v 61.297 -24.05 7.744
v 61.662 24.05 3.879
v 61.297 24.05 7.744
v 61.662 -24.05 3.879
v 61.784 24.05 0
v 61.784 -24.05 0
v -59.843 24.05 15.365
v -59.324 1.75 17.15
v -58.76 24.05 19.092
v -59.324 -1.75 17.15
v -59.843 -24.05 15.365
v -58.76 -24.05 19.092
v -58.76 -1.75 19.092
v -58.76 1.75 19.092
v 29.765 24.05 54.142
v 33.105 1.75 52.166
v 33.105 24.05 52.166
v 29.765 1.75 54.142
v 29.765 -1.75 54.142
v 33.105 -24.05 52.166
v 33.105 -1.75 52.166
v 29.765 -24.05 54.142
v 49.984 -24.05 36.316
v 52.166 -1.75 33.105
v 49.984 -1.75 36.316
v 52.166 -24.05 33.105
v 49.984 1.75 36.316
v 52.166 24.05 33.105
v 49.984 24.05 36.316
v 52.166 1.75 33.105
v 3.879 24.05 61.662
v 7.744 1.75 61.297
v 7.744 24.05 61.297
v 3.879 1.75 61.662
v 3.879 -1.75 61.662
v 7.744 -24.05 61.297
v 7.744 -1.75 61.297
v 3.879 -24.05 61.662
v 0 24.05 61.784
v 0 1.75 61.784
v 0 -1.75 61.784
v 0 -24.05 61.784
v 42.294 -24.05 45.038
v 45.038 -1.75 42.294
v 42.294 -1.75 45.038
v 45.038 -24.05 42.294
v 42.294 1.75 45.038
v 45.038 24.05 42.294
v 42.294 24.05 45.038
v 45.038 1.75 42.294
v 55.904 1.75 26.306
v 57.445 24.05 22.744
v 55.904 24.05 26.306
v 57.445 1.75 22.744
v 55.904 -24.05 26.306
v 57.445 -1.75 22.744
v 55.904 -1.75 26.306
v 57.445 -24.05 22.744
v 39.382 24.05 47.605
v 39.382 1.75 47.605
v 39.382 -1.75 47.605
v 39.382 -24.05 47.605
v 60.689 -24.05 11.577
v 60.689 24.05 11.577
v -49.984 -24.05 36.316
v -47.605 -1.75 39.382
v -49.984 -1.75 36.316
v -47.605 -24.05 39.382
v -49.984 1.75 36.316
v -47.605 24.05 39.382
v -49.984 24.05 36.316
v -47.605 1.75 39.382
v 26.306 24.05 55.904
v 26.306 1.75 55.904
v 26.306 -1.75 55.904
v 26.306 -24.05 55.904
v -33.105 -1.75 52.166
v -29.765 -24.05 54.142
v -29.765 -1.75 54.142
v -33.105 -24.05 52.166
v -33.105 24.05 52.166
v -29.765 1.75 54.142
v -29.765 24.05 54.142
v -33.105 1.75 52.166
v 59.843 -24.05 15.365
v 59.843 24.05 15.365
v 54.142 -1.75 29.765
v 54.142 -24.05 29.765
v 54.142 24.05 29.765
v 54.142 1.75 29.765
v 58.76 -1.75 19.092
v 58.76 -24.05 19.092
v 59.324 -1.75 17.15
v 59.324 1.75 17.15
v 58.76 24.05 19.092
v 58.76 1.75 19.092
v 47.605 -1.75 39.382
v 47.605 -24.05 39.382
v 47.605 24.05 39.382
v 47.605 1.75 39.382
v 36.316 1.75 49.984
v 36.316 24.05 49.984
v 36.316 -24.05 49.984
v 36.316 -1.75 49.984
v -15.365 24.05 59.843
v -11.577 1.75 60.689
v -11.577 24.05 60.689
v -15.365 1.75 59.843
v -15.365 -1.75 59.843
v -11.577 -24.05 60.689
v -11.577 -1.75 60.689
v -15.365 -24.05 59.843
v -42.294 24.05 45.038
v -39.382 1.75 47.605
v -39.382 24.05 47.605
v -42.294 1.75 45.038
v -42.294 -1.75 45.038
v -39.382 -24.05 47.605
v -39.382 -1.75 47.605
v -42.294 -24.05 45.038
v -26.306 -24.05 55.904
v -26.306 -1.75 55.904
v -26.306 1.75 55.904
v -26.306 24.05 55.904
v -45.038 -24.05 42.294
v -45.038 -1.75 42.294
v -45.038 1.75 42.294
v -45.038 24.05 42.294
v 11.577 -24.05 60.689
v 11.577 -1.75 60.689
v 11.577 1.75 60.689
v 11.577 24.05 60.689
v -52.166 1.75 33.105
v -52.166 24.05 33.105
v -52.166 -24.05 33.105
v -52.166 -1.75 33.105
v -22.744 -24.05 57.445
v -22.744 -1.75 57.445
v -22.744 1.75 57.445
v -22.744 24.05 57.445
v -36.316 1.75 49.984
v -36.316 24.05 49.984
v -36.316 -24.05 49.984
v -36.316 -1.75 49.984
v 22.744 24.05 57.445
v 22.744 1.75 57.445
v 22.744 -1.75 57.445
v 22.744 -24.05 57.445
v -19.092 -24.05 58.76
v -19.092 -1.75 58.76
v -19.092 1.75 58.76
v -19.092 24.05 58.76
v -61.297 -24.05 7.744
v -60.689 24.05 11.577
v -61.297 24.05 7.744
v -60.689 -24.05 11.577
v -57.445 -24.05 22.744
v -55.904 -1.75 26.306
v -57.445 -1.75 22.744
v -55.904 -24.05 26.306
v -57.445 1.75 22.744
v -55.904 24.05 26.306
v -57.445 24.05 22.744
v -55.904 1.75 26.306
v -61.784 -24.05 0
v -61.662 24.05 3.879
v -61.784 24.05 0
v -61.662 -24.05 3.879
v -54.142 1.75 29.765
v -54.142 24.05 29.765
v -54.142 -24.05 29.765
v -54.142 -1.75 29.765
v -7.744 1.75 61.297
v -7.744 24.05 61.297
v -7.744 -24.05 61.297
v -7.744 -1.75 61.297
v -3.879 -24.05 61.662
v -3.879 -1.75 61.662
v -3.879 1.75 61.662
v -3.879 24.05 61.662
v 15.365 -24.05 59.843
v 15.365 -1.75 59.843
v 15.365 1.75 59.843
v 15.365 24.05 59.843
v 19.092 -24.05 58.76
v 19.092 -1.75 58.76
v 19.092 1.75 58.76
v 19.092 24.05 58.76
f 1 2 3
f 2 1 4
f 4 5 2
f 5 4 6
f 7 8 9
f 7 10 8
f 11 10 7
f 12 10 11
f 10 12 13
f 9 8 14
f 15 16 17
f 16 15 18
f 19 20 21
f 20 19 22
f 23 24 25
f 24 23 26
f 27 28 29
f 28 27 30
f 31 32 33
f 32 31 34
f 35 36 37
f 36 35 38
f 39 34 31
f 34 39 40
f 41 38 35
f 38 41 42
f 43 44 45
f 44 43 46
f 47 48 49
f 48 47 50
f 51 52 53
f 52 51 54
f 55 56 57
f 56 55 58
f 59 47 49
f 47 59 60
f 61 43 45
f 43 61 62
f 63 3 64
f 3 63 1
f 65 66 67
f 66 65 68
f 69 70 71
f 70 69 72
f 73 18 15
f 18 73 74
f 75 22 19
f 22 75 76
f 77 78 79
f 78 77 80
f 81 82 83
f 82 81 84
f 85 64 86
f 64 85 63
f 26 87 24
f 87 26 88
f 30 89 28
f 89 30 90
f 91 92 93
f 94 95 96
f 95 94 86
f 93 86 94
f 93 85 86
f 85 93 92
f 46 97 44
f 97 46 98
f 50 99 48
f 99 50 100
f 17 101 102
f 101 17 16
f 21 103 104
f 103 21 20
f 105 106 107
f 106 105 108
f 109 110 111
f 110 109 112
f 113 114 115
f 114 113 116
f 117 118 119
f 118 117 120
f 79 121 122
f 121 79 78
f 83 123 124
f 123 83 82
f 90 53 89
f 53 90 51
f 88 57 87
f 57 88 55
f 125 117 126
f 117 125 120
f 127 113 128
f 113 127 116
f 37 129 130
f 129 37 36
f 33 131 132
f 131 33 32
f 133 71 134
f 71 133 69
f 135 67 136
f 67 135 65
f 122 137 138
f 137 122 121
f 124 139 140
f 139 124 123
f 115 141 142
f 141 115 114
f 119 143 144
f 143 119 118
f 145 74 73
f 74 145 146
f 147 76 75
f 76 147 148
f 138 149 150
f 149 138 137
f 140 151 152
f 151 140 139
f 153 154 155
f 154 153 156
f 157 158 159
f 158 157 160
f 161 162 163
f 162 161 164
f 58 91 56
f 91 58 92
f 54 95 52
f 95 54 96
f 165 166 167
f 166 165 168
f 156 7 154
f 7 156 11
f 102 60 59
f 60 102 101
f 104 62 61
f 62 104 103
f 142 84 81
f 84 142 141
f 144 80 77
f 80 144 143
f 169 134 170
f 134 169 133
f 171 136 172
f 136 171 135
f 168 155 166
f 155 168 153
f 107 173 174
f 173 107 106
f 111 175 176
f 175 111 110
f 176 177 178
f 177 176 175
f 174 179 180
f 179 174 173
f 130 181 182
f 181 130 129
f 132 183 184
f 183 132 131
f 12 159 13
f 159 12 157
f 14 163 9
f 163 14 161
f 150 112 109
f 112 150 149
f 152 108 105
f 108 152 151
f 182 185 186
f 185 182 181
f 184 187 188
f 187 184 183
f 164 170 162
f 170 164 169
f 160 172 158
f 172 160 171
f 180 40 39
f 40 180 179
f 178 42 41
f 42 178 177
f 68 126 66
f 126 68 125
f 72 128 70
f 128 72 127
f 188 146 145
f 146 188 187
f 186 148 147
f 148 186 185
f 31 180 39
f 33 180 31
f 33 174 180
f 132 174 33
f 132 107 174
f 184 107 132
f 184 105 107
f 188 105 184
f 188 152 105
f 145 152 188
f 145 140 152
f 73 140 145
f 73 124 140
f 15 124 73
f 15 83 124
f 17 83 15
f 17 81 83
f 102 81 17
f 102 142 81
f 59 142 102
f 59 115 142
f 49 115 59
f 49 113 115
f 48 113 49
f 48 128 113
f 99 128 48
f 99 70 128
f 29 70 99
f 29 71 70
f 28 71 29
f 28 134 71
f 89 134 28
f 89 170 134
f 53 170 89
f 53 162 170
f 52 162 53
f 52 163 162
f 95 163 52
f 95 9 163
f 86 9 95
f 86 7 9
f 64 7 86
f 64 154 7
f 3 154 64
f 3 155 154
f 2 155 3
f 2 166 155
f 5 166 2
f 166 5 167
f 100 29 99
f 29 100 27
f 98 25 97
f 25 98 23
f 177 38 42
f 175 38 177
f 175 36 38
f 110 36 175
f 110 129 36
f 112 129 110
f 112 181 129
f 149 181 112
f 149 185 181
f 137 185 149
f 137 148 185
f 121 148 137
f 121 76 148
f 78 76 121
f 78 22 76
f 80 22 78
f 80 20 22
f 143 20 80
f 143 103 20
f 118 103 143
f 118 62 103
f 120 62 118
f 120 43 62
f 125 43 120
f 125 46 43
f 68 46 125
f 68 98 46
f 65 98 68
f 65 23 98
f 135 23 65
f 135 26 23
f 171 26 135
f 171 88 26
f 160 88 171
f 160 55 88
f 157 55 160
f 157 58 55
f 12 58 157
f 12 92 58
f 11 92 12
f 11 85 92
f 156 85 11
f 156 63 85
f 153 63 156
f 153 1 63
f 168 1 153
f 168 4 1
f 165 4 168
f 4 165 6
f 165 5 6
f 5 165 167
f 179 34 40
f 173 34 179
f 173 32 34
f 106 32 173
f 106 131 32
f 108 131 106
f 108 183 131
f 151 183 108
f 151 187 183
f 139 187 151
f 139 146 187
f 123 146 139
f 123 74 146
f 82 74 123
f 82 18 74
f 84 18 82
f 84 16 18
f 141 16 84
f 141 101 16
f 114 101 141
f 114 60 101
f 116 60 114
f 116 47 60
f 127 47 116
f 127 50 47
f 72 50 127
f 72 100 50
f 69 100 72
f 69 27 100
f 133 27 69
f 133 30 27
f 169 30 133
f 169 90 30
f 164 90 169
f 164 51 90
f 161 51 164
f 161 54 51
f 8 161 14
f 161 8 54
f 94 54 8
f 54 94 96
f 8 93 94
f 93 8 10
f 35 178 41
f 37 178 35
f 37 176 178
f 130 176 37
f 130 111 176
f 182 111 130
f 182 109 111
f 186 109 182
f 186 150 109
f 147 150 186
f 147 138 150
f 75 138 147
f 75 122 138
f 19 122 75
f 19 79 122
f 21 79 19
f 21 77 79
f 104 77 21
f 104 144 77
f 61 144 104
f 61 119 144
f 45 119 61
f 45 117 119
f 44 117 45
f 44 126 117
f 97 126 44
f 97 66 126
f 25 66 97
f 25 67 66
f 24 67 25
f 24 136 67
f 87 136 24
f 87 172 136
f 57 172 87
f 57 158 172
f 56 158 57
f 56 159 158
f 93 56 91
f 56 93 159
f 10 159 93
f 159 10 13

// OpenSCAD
//number of records
records=1;

for(i=[0:1:records-1])
{
    translate([0,25*i,0])    difference(){
difference(){
    $fn=100;
rotate([90,0,0])cylinder(38.1+10,114.3/1.85,114.3/1.85,center=true);
translate([0,0,-314.3/2-10])rotate([90,0,0])cube([314.3*2+50,314.3+20,314.3],center=true);
}
translate([0,0,114.3+60])rotate([-90,0,0])cube([314.3,314.3,3.5], center=true);
}
}
